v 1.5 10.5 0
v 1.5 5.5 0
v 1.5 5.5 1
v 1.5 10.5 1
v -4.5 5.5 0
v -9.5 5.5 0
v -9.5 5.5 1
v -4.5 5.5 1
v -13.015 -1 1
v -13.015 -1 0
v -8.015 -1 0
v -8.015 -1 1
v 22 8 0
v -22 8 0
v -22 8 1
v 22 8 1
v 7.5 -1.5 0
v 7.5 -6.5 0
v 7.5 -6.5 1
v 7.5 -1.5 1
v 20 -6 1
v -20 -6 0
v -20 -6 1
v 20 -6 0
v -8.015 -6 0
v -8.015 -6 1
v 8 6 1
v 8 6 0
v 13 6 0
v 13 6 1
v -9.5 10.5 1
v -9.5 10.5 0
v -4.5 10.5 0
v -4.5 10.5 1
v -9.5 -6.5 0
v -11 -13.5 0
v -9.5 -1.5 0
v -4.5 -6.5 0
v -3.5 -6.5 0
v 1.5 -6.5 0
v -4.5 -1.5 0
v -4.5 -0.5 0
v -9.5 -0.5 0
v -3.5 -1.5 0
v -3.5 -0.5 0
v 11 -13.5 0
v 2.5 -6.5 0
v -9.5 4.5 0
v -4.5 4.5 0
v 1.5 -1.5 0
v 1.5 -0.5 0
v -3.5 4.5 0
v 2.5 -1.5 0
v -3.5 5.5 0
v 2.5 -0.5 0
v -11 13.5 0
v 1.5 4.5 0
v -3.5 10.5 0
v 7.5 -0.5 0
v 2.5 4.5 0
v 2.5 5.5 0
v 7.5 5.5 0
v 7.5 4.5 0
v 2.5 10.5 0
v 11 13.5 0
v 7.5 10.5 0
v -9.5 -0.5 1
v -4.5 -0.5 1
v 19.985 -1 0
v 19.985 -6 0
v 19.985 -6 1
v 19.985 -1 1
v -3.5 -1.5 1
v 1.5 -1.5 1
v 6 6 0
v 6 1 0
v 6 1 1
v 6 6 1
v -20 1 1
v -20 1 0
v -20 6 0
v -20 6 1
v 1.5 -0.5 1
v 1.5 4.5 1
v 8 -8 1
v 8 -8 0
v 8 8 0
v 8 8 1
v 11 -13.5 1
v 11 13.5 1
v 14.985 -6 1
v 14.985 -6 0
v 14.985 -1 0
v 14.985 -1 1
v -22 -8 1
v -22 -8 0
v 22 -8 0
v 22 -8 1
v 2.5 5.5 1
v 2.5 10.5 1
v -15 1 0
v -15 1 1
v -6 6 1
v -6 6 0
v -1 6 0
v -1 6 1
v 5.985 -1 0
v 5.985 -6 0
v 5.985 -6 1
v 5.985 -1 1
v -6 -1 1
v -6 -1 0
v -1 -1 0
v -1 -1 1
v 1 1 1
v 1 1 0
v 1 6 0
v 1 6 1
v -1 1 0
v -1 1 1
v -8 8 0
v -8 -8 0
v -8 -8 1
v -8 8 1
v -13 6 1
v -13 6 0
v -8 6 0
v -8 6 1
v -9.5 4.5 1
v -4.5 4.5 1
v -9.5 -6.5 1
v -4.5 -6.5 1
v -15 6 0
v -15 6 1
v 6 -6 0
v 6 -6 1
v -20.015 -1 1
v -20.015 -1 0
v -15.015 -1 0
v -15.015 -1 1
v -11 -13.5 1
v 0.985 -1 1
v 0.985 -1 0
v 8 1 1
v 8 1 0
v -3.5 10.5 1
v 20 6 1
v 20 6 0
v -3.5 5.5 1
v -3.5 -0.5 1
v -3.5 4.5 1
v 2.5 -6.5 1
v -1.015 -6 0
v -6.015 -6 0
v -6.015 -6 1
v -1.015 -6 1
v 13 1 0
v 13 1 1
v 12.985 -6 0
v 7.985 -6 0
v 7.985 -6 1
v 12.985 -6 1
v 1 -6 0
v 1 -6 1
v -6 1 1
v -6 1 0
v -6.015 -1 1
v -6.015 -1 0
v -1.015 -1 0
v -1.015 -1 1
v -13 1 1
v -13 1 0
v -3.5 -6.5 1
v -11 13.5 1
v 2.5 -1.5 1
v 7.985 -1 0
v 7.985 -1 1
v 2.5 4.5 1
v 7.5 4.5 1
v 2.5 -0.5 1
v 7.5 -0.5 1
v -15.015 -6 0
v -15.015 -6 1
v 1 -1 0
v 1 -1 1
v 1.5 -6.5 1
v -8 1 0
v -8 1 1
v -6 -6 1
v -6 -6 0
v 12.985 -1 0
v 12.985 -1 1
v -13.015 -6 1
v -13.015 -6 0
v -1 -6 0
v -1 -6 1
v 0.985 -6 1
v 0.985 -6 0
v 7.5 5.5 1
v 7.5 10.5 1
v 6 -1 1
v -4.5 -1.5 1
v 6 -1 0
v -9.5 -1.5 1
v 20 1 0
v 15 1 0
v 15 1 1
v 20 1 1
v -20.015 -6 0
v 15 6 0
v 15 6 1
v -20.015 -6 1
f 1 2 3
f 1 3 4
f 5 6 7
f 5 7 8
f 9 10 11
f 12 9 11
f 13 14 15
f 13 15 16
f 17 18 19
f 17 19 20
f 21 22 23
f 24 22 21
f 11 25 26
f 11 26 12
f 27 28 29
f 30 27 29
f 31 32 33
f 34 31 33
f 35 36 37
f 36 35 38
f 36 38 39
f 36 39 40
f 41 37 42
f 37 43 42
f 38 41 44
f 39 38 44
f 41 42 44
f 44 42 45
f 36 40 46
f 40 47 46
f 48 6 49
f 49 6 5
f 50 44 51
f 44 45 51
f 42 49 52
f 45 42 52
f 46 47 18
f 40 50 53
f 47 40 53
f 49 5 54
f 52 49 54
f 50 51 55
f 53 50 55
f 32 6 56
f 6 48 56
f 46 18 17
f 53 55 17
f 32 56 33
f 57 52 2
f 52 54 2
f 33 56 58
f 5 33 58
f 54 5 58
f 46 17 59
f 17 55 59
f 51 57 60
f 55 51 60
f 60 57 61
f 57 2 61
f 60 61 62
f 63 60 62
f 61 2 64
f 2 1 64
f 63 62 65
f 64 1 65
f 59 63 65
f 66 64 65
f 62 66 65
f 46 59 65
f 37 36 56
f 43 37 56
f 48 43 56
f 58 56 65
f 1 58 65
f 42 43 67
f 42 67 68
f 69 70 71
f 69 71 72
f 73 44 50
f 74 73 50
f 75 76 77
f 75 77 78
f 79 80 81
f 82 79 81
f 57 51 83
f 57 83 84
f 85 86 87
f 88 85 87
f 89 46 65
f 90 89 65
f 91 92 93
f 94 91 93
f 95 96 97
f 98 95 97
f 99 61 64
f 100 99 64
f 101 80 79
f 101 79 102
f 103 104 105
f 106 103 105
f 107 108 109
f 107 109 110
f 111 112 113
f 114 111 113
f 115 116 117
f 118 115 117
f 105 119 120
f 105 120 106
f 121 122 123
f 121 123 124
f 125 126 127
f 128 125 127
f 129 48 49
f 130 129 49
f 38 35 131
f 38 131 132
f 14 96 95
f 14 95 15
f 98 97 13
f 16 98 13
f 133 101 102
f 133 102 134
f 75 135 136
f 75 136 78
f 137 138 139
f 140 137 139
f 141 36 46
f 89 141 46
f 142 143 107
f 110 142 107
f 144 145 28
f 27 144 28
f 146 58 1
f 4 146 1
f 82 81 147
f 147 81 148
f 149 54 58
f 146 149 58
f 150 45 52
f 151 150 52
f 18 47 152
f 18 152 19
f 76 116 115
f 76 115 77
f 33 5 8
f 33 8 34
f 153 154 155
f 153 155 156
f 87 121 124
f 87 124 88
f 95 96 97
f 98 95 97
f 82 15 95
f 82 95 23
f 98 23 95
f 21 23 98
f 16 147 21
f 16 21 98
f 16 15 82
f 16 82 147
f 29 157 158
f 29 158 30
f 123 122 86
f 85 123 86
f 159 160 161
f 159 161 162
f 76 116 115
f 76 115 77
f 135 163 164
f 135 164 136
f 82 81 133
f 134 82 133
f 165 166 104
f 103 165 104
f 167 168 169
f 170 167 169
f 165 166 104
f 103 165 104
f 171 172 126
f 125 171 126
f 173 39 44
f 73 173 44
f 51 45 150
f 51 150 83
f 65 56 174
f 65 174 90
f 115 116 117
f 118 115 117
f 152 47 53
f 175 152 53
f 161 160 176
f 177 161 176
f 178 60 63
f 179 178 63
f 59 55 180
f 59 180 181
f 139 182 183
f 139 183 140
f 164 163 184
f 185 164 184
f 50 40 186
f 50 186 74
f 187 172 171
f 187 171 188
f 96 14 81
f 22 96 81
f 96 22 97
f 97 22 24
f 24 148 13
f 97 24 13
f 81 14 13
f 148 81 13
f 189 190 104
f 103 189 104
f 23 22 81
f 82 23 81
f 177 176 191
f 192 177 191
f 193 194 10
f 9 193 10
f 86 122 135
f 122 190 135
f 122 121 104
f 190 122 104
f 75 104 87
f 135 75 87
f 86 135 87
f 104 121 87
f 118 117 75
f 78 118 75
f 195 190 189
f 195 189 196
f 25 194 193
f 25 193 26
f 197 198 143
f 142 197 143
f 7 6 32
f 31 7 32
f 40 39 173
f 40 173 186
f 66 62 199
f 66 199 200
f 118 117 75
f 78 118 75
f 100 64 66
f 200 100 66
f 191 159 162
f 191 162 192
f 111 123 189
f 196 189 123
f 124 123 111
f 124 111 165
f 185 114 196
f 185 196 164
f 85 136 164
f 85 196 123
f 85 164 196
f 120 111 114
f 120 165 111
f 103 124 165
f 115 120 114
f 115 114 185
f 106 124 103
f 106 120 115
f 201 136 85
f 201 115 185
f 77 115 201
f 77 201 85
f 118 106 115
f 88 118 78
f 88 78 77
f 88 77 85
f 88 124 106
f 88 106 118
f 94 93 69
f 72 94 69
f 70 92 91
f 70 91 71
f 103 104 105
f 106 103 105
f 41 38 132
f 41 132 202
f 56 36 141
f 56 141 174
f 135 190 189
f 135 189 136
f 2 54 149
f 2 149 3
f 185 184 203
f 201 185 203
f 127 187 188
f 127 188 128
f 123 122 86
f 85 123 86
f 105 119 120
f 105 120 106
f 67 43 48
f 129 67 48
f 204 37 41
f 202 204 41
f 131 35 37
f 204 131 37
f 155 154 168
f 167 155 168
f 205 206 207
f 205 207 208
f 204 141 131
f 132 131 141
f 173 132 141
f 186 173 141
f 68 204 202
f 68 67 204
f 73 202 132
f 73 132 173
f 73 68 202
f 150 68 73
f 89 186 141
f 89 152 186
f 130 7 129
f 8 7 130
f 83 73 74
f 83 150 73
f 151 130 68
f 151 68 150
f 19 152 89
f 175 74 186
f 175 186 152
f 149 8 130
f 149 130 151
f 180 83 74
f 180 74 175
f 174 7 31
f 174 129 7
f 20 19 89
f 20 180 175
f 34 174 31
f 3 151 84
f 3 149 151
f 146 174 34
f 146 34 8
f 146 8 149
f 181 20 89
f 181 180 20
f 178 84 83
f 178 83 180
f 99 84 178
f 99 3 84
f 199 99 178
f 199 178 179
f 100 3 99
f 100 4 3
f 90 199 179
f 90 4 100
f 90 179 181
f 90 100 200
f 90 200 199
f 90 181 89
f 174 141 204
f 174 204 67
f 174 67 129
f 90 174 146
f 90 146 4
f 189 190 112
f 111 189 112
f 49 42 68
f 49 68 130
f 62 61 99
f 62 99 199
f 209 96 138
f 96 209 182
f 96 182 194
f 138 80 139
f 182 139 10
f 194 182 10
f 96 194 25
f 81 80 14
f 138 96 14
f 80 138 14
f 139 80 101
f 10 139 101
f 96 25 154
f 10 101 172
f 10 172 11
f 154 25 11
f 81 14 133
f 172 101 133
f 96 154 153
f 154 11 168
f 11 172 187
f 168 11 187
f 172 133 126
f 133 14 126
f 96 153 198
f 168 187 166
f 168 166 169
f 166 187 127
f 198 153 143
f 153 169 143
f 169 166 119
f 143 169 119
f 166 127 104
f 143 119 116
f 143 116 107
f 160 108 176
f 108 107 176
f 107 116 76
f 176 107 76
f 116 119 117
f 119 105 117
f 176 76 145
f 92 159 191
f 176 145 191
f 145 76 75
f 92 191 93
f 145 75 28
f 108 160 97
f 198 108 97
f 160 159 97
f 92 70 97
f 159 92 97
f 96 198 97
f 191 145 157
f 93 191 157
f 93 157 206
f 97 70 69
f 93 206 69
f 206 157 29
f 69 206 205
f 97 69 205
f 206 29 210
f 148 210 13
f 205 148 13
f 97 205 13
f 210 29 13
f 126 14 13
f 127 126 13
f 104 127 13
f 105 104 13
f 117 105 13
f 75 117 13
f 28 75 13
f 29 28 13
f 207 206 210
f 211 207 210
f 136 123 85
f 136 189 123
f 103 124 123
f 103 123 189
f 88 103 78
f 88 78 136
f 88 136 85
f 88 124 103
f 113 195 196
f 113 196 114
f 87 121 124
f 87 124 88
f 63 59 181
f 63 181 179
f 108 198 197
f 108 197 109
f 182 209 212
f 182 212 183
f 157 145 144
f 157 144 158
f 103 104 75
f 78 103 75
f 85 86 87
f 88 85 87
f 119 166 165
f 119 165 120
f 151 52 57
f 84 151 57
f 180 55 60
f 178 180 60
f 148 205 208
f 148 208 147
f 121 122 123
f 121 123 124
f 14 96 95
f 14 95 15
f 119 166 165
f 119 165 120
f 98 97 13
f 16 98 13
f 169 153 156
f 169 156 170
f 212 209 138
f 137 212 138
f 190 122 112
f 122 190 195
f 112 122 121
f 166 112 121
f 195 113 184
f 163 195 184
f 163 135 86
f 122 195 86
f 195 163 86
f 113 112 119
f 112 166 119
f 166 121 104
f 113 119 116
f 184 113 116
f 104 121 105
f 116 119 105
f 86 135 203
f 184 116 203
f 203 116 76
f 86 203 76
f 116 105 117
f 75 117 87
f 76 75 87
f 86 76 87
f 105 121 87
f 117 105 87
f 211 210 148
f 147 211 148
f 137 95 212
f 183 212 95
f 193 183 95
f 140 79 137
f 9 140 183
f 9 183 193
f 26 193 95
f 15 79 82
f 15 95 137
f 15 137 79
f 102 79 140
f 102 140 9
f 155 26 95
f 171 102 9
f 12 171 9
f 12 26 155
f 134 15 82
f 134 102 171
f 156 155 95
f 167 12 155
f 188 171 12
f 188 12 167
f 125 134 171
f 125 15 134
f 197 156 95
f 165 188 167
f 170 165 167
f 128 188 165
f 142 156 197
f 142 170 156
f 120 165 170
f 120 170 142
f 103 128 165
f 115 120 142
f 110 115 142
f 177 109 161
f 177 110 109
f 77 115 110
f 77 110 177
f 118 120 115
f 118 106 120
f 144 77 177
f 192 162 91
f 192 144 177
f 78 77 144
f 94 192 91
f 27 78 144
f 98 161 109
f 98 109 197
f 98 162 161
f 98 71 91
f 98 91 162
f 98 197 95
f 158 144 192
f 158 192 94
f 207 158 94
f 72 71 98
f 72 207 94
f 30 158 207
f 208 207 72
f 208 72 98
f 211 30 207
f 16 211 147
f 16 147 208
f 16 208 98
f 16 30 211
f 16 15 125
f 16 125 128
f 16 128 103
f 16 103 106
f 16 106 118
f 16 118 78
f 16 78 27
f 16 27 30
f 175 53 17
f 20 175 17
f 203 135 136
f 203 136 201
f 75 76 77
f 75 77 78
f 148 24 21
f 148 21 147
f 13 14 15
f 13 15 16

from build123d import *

# Parameters (mm, degrees)
F1_W     = 16
F1_H     = 16
F1_W_2   = 5
F1_H_2   = 5
F4_DEPTH = 1
F0_W     = 16
F0_H     = 16
F0_W_2   = 12
F0_H_2   = 12
F5_DEPTH = 1
F2_W     = 44
F2_H     = 16
F2_W_2   = 5
F2_H_2   = 5
F6_DEPTH = 1
F3_W     = 44
F3_H     = 16
F3_W_2   = 40
F3_H_2   = 12
F7_DEPTH = 1
F8_W     = 22
F8_H     = 27
F8_W_2   = 5
F8_H_2   = 5
F9_DEPTH = 1


with BuildPart() as f4:
    # F1 (on Top) → F4 (new body)
    with BuildSketch(Plane.XY):
        Rectangle(F1_W, F1_H)
        with Locations((-3.5, -3.5)):
            Rectangle(F1_W_2, F1_H_2, mode=Mode.SUBTRACT)
        with Locations((3.5, -3.5)):
            Rectangle(F1_W_2, F1_H_2, mode=Mode.SUBTRACT)
        with Locations((-3.5, 3.5)):
            Rectangle(F1_W_2, F1_H_2, mode=Mode.SUBTRACT)
        with Locations((3.5, 3.5)):
            Rectangle(F1_W_2, F1_H_2, mode=Mode.SUBTRACT)
    extrude(amount=F4_DEPTH)


with BuildPart() as f5:
    # F0 (on Top) → F5 (new body)
    with BuildSketch(Plane.XY):
        Rectangle(F0_W, F0_H)
        Rectangle(F0_W_2, F0_H_2, mode=Mode.SUBTRACT)
    extrude(amount=F5_DEPTH)


with BuildPart() as f6:
    # F2 (on Top) → F6 (new body)
    with BuildSketch(Plane.XY):
        Rectangle(F2_W, F2_H)
        with Locations((-17.514802, -3.499984)):
            Rectangle(F2_W_2, F2_H_2, mode=Mode.SUBTRACT)
        with Locations((-10.514802, -3.499984)):
            Rectangle(F2_W_2, F2_H_2, mode=Mode.SUBTRACT)
        with Locations((-3.514802, -3.499984)):
            Rectangle(F2_W_2, F2_H_2, mode=Mode.SUBTRACT)
        with Locations((3.485198, -3.499984)):
            Rectangle(F2_W_2, F2_H_2, mode=Mode.SUBTRACT)
        with Locations((10.485198, -3.499984)):
            Rectangle(F2_W_2, F2_H_2, mode=Mode.SUBTRACT)
        with Locations((17.485198, -3.499984)):
            Rectangle(F2_W_2, F2_H_2, mode=Mode.SUBTRACT)
        with Locations((-17.5, 3.5)):
            Rectangle(F2_W_2, F2_H_2, mode=Mode.SUBTRACT)
        with Locations((-10.5, 3.5)):
            Rectangle(F2_W_2, F2_H_2, mode=Mode.SUBTRACT)
        with Locations((-3.5, 3.5)):
            Rectangle(F2_W_2, F2_H_2, mode=Mode.SUBTRACT)
        with Locations((3.5, 3.5)):
            Rectangle(F2_W_2, F2_H_2, mode=Mode.SUBTRACT)
        with Locations((10.5, 3.5)):
            Rectangle(F2_W_2, F2_H_2, mode=Mode.SUBTRACT)
        with Locations((17.5, 3.5)):
            Rectangle(F2_W_2, F2_H_2, mode=Mode.SUBTRACT)
    extrude(amount=F6_DEPTH)


with BuildPart() as f7:
    # F3 (on Top) → F7 (new body)
    with BuildSketch(Plane.XY):
        Rectangle(F3_W, F3_H)
        Rectangle(F3_W_2, F3_H_2, mode=Mode.SUBTRACT)
    extrude(amount=F7_DEPTH)


with BuildPart() as f9:
    # F8 (on Top) → F9 (new body)
    with BuildSketch(Plane.XY):
        Rectangle(F8_W, F8_H)
        with Locations((-7, -4)):
            Rectangle(F8_W_2, F8_H_2, mode=Mode.SUBTRACT)
        with Locations((-1, -4)):
            Rectangle(F8_W_2, F8_H_2, mode=Mode.SUBTRACT)
        with Locations((5, -4)):
            Rectangle(F8_W_2, F8_H_2, mode=Mode.SUBTRACT)
        with Locations((-7, 2)):
            Rectangle(F8_W_2, F8_H_2, mode=Mode.SUBTRACT)
        with Locations((-1, 2)):
            Rectangle(F8_W_2, F8_H_2, mode=Mode.SUBTRACT)
        with Locations((-7, 8)):
            Rectangle(F8_W_2, F8_H_2, mode=Mode.SUBTRACT)
        with Locations((-1, 8)):
            Rectangle(F8_W_2, F8_H_2, mode=Mode.SUBTRACT)
        with Locations((5, 2)):
            Rectangle(F8_W_2, F8_H_2, mode=Mode.SUBTRACT)
        with Locations((5, 8)):
            Rectangle(F8_W_2, F8_H_2, mode=Mode.SUBTRACT)
    extrude(amount=F9_DEPTH)


solid = Compound([f4.part, f5.part, f6.part, f7.part, f9.part])
